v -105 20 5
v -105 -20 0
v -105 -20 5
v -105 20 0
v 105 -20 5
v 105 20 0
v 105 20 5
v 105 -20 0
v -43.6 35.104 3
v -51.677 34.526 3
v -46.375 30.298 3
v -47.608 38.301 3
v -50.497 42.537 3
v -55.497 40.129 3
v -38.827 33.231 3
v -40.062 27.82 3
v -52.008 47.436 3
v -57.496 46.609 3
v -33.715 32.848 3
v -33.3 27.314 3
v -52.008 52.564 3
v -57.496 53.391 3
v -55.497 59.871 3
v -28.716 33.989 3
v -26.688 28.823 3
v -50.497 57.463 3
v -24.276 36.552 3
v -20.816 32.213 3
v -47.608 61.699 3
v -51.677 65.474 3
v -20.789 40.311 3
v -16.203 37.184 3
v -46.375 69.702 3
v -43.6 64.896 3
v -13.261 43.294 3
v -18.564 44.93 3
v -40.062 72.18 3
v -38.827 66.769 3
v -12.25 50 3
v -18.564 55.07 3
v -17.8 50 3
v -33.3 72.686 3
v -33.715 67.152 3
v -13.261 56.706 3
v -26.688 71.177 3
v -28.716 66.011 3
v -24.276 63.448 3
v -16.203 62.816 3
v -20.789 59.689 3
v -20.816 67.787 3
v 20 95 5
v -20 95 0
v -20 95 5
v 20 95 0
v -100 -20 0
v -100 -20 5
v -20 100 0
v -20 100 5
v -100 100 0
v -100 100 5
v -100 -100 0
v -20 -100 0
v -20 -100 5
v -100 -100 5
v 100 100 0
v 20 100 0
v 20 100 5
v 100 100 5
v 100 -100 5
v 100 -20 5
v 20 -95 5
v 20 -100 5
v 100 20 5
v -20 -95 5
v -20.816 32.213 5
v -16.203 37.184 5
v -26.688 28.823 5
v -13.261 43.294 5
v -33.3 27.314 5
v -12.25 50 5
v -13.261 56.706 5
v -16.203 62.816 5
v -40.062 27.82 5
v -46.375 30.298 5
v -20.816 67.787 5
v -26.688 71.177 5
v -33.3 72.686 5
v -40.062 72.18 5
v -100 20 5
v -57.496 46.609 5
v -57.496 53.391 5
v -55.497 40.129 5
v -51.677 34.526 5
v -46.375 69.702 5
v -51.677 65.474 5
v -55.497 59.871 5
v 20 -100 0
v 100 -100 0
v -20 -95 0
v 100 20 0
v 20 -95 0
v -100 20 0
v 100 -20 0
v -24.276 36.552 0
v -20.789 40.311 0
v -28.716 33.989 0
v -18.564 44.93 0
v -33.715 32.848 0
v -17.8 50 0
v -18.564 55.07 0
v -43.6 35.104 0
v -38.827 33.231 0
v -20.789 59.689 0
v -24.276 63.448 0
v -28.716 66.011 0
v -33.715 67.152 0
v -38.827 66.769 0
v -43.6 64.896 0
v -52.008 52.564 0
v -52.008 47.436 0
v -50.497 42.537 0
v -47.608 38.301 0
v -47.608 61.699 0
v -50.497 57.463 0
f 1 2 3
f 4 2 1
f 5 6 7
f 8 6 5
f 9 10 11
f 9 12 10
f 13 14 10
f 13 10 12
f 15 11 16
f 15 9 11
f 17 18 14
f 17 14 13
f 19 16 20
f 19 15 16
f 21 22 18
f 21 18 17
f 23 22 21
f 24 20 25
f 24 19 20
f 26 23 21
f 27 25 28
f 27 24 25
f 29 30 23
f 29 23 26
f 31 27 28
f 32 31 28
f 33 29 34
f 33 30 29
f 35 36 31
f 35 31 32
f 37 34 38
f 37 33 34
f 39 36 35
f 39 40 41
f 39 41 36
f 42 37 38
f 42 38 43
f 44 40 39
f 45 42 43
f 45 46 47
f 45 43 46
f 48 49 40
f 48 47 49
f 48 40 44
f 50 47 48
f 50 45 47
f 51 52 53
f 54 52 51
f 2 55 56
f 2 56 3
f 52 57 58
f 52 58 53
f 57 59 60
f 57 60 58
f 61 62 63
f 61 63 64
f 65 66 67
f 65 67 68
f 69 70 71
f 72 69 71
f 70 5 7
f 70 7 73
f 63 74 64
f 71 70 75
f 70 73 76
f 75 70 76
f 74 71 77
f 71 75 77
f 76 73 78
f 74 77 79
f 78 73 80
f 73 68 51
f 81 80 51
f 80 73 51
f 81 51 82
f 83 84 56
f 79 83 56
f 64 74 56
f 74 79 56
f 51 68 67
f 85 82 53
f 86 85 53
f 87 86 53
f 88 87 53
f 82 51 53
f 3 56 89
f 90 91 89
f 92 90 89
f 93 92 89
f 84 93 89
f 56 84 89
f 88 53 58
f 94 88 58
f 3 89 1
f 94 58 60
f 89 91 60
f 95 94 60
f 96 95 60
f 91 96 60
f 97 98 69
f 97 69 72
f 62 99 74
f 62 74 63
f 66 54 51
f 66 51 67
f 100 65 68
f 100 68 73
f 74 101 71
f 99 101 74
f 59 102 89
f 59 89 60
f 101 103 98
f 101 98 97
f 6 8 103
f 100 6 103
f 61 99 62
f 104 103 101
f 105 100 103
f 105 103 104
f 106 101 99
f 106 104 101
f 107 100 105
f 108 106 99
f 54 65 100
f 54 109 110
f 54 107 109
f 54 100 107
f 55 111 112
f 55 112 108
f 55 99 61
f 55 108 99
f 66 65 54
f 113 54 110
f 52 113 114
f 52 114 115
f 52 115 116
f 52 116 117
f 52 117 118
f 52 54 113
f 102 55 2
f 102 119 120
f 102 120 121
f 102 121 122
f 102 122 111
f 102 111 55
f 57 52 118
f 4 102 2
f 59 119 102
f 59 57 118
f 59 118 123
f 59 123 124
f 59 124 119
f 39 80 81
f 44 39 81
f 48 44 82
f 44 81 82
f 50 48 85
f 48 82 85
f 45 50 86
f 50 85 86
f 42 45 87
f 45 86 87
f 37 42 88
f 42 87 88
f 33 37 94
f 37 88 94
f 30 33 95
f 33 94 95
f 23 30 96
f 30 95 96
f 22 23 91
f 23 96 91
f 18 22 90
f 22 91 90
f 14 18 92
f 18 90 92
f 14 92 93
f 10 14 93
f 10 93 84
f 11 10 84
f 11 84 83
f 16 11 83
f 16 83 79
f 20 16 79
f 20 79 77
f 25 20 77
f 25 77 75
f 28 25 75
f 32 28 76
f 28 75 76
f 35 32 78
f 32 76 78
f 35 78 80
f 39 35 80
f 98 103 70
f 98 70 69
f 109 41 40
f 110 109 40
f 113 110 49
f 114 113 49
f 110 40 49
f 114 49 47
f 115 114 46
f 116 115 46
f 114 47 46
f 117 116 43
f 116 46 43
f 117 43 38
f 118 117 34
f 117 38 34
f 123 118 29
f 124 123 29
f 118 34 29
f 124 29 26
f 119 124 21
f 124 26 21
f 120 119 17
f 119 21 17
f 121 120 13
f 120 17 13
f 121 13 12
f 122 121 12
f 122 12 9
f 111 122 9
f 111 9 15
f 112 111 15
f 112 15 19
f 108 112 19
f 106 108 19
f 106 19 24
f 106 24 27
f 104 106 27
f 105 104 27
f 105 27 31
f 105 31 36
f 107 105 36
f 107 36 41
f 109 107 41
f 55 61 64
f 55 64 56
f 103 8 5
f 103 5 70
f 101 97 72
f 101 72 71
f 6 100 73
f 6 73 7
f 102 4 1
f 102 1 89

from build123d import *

# Parameters (mm, degrees)
SALIENTE_EXTRUIR1_DEPTH = 5
CROQUIS2_R              = 17.2
CORTAR_EXTRUIR1_DEPTH   = 5
CROQUIS3_R              = 22.75
CORTAR_EXTRUIR2_DEPTH   = 2


with BuildPart() as part:
    # Croquis1 → Saliente-Extruir1 (new body)
    with BuildSketch(Plane.XY):
        Polygon((-100, -100), (-100, -20), (-105, -20), (-105, 20), (-100, 20), (-100, 100), (-20, 100), (-20, 95), (20, 95), (20, 100), (100, 100), (100, 20), (105, 20), (105, -20), (100, -20), (100, -100), (20, -100), (20, -95), (-20, -95), (-20, -100), align=None)
    extrude(amount=SALIENTE_EXTRUIR1_DEPTH)

    # Croquis2 → Cortar-Extruir1 (cut)
    with BuildSketch(Plane.XY.offset(5)):
        with Locations((-35, 50)):
            Circle(CROQUIS2_R)
    extrude(amount=-CORTAR_EXTRUIR1_DEPTH, mode=Mode.SUBTRACT)

    # Croquis3 → Cortar-Extruir2 (cut)
    with BuildSketch(Plane.XY.offset(5)):
        with Locations((-35, 50)):
            Circle(CROQUIS3_R)
    extrude(amount=-CORTAR_EXTRUIR2_DEPTH, mode=Mode.SUBTRACT)


solid = part.part
